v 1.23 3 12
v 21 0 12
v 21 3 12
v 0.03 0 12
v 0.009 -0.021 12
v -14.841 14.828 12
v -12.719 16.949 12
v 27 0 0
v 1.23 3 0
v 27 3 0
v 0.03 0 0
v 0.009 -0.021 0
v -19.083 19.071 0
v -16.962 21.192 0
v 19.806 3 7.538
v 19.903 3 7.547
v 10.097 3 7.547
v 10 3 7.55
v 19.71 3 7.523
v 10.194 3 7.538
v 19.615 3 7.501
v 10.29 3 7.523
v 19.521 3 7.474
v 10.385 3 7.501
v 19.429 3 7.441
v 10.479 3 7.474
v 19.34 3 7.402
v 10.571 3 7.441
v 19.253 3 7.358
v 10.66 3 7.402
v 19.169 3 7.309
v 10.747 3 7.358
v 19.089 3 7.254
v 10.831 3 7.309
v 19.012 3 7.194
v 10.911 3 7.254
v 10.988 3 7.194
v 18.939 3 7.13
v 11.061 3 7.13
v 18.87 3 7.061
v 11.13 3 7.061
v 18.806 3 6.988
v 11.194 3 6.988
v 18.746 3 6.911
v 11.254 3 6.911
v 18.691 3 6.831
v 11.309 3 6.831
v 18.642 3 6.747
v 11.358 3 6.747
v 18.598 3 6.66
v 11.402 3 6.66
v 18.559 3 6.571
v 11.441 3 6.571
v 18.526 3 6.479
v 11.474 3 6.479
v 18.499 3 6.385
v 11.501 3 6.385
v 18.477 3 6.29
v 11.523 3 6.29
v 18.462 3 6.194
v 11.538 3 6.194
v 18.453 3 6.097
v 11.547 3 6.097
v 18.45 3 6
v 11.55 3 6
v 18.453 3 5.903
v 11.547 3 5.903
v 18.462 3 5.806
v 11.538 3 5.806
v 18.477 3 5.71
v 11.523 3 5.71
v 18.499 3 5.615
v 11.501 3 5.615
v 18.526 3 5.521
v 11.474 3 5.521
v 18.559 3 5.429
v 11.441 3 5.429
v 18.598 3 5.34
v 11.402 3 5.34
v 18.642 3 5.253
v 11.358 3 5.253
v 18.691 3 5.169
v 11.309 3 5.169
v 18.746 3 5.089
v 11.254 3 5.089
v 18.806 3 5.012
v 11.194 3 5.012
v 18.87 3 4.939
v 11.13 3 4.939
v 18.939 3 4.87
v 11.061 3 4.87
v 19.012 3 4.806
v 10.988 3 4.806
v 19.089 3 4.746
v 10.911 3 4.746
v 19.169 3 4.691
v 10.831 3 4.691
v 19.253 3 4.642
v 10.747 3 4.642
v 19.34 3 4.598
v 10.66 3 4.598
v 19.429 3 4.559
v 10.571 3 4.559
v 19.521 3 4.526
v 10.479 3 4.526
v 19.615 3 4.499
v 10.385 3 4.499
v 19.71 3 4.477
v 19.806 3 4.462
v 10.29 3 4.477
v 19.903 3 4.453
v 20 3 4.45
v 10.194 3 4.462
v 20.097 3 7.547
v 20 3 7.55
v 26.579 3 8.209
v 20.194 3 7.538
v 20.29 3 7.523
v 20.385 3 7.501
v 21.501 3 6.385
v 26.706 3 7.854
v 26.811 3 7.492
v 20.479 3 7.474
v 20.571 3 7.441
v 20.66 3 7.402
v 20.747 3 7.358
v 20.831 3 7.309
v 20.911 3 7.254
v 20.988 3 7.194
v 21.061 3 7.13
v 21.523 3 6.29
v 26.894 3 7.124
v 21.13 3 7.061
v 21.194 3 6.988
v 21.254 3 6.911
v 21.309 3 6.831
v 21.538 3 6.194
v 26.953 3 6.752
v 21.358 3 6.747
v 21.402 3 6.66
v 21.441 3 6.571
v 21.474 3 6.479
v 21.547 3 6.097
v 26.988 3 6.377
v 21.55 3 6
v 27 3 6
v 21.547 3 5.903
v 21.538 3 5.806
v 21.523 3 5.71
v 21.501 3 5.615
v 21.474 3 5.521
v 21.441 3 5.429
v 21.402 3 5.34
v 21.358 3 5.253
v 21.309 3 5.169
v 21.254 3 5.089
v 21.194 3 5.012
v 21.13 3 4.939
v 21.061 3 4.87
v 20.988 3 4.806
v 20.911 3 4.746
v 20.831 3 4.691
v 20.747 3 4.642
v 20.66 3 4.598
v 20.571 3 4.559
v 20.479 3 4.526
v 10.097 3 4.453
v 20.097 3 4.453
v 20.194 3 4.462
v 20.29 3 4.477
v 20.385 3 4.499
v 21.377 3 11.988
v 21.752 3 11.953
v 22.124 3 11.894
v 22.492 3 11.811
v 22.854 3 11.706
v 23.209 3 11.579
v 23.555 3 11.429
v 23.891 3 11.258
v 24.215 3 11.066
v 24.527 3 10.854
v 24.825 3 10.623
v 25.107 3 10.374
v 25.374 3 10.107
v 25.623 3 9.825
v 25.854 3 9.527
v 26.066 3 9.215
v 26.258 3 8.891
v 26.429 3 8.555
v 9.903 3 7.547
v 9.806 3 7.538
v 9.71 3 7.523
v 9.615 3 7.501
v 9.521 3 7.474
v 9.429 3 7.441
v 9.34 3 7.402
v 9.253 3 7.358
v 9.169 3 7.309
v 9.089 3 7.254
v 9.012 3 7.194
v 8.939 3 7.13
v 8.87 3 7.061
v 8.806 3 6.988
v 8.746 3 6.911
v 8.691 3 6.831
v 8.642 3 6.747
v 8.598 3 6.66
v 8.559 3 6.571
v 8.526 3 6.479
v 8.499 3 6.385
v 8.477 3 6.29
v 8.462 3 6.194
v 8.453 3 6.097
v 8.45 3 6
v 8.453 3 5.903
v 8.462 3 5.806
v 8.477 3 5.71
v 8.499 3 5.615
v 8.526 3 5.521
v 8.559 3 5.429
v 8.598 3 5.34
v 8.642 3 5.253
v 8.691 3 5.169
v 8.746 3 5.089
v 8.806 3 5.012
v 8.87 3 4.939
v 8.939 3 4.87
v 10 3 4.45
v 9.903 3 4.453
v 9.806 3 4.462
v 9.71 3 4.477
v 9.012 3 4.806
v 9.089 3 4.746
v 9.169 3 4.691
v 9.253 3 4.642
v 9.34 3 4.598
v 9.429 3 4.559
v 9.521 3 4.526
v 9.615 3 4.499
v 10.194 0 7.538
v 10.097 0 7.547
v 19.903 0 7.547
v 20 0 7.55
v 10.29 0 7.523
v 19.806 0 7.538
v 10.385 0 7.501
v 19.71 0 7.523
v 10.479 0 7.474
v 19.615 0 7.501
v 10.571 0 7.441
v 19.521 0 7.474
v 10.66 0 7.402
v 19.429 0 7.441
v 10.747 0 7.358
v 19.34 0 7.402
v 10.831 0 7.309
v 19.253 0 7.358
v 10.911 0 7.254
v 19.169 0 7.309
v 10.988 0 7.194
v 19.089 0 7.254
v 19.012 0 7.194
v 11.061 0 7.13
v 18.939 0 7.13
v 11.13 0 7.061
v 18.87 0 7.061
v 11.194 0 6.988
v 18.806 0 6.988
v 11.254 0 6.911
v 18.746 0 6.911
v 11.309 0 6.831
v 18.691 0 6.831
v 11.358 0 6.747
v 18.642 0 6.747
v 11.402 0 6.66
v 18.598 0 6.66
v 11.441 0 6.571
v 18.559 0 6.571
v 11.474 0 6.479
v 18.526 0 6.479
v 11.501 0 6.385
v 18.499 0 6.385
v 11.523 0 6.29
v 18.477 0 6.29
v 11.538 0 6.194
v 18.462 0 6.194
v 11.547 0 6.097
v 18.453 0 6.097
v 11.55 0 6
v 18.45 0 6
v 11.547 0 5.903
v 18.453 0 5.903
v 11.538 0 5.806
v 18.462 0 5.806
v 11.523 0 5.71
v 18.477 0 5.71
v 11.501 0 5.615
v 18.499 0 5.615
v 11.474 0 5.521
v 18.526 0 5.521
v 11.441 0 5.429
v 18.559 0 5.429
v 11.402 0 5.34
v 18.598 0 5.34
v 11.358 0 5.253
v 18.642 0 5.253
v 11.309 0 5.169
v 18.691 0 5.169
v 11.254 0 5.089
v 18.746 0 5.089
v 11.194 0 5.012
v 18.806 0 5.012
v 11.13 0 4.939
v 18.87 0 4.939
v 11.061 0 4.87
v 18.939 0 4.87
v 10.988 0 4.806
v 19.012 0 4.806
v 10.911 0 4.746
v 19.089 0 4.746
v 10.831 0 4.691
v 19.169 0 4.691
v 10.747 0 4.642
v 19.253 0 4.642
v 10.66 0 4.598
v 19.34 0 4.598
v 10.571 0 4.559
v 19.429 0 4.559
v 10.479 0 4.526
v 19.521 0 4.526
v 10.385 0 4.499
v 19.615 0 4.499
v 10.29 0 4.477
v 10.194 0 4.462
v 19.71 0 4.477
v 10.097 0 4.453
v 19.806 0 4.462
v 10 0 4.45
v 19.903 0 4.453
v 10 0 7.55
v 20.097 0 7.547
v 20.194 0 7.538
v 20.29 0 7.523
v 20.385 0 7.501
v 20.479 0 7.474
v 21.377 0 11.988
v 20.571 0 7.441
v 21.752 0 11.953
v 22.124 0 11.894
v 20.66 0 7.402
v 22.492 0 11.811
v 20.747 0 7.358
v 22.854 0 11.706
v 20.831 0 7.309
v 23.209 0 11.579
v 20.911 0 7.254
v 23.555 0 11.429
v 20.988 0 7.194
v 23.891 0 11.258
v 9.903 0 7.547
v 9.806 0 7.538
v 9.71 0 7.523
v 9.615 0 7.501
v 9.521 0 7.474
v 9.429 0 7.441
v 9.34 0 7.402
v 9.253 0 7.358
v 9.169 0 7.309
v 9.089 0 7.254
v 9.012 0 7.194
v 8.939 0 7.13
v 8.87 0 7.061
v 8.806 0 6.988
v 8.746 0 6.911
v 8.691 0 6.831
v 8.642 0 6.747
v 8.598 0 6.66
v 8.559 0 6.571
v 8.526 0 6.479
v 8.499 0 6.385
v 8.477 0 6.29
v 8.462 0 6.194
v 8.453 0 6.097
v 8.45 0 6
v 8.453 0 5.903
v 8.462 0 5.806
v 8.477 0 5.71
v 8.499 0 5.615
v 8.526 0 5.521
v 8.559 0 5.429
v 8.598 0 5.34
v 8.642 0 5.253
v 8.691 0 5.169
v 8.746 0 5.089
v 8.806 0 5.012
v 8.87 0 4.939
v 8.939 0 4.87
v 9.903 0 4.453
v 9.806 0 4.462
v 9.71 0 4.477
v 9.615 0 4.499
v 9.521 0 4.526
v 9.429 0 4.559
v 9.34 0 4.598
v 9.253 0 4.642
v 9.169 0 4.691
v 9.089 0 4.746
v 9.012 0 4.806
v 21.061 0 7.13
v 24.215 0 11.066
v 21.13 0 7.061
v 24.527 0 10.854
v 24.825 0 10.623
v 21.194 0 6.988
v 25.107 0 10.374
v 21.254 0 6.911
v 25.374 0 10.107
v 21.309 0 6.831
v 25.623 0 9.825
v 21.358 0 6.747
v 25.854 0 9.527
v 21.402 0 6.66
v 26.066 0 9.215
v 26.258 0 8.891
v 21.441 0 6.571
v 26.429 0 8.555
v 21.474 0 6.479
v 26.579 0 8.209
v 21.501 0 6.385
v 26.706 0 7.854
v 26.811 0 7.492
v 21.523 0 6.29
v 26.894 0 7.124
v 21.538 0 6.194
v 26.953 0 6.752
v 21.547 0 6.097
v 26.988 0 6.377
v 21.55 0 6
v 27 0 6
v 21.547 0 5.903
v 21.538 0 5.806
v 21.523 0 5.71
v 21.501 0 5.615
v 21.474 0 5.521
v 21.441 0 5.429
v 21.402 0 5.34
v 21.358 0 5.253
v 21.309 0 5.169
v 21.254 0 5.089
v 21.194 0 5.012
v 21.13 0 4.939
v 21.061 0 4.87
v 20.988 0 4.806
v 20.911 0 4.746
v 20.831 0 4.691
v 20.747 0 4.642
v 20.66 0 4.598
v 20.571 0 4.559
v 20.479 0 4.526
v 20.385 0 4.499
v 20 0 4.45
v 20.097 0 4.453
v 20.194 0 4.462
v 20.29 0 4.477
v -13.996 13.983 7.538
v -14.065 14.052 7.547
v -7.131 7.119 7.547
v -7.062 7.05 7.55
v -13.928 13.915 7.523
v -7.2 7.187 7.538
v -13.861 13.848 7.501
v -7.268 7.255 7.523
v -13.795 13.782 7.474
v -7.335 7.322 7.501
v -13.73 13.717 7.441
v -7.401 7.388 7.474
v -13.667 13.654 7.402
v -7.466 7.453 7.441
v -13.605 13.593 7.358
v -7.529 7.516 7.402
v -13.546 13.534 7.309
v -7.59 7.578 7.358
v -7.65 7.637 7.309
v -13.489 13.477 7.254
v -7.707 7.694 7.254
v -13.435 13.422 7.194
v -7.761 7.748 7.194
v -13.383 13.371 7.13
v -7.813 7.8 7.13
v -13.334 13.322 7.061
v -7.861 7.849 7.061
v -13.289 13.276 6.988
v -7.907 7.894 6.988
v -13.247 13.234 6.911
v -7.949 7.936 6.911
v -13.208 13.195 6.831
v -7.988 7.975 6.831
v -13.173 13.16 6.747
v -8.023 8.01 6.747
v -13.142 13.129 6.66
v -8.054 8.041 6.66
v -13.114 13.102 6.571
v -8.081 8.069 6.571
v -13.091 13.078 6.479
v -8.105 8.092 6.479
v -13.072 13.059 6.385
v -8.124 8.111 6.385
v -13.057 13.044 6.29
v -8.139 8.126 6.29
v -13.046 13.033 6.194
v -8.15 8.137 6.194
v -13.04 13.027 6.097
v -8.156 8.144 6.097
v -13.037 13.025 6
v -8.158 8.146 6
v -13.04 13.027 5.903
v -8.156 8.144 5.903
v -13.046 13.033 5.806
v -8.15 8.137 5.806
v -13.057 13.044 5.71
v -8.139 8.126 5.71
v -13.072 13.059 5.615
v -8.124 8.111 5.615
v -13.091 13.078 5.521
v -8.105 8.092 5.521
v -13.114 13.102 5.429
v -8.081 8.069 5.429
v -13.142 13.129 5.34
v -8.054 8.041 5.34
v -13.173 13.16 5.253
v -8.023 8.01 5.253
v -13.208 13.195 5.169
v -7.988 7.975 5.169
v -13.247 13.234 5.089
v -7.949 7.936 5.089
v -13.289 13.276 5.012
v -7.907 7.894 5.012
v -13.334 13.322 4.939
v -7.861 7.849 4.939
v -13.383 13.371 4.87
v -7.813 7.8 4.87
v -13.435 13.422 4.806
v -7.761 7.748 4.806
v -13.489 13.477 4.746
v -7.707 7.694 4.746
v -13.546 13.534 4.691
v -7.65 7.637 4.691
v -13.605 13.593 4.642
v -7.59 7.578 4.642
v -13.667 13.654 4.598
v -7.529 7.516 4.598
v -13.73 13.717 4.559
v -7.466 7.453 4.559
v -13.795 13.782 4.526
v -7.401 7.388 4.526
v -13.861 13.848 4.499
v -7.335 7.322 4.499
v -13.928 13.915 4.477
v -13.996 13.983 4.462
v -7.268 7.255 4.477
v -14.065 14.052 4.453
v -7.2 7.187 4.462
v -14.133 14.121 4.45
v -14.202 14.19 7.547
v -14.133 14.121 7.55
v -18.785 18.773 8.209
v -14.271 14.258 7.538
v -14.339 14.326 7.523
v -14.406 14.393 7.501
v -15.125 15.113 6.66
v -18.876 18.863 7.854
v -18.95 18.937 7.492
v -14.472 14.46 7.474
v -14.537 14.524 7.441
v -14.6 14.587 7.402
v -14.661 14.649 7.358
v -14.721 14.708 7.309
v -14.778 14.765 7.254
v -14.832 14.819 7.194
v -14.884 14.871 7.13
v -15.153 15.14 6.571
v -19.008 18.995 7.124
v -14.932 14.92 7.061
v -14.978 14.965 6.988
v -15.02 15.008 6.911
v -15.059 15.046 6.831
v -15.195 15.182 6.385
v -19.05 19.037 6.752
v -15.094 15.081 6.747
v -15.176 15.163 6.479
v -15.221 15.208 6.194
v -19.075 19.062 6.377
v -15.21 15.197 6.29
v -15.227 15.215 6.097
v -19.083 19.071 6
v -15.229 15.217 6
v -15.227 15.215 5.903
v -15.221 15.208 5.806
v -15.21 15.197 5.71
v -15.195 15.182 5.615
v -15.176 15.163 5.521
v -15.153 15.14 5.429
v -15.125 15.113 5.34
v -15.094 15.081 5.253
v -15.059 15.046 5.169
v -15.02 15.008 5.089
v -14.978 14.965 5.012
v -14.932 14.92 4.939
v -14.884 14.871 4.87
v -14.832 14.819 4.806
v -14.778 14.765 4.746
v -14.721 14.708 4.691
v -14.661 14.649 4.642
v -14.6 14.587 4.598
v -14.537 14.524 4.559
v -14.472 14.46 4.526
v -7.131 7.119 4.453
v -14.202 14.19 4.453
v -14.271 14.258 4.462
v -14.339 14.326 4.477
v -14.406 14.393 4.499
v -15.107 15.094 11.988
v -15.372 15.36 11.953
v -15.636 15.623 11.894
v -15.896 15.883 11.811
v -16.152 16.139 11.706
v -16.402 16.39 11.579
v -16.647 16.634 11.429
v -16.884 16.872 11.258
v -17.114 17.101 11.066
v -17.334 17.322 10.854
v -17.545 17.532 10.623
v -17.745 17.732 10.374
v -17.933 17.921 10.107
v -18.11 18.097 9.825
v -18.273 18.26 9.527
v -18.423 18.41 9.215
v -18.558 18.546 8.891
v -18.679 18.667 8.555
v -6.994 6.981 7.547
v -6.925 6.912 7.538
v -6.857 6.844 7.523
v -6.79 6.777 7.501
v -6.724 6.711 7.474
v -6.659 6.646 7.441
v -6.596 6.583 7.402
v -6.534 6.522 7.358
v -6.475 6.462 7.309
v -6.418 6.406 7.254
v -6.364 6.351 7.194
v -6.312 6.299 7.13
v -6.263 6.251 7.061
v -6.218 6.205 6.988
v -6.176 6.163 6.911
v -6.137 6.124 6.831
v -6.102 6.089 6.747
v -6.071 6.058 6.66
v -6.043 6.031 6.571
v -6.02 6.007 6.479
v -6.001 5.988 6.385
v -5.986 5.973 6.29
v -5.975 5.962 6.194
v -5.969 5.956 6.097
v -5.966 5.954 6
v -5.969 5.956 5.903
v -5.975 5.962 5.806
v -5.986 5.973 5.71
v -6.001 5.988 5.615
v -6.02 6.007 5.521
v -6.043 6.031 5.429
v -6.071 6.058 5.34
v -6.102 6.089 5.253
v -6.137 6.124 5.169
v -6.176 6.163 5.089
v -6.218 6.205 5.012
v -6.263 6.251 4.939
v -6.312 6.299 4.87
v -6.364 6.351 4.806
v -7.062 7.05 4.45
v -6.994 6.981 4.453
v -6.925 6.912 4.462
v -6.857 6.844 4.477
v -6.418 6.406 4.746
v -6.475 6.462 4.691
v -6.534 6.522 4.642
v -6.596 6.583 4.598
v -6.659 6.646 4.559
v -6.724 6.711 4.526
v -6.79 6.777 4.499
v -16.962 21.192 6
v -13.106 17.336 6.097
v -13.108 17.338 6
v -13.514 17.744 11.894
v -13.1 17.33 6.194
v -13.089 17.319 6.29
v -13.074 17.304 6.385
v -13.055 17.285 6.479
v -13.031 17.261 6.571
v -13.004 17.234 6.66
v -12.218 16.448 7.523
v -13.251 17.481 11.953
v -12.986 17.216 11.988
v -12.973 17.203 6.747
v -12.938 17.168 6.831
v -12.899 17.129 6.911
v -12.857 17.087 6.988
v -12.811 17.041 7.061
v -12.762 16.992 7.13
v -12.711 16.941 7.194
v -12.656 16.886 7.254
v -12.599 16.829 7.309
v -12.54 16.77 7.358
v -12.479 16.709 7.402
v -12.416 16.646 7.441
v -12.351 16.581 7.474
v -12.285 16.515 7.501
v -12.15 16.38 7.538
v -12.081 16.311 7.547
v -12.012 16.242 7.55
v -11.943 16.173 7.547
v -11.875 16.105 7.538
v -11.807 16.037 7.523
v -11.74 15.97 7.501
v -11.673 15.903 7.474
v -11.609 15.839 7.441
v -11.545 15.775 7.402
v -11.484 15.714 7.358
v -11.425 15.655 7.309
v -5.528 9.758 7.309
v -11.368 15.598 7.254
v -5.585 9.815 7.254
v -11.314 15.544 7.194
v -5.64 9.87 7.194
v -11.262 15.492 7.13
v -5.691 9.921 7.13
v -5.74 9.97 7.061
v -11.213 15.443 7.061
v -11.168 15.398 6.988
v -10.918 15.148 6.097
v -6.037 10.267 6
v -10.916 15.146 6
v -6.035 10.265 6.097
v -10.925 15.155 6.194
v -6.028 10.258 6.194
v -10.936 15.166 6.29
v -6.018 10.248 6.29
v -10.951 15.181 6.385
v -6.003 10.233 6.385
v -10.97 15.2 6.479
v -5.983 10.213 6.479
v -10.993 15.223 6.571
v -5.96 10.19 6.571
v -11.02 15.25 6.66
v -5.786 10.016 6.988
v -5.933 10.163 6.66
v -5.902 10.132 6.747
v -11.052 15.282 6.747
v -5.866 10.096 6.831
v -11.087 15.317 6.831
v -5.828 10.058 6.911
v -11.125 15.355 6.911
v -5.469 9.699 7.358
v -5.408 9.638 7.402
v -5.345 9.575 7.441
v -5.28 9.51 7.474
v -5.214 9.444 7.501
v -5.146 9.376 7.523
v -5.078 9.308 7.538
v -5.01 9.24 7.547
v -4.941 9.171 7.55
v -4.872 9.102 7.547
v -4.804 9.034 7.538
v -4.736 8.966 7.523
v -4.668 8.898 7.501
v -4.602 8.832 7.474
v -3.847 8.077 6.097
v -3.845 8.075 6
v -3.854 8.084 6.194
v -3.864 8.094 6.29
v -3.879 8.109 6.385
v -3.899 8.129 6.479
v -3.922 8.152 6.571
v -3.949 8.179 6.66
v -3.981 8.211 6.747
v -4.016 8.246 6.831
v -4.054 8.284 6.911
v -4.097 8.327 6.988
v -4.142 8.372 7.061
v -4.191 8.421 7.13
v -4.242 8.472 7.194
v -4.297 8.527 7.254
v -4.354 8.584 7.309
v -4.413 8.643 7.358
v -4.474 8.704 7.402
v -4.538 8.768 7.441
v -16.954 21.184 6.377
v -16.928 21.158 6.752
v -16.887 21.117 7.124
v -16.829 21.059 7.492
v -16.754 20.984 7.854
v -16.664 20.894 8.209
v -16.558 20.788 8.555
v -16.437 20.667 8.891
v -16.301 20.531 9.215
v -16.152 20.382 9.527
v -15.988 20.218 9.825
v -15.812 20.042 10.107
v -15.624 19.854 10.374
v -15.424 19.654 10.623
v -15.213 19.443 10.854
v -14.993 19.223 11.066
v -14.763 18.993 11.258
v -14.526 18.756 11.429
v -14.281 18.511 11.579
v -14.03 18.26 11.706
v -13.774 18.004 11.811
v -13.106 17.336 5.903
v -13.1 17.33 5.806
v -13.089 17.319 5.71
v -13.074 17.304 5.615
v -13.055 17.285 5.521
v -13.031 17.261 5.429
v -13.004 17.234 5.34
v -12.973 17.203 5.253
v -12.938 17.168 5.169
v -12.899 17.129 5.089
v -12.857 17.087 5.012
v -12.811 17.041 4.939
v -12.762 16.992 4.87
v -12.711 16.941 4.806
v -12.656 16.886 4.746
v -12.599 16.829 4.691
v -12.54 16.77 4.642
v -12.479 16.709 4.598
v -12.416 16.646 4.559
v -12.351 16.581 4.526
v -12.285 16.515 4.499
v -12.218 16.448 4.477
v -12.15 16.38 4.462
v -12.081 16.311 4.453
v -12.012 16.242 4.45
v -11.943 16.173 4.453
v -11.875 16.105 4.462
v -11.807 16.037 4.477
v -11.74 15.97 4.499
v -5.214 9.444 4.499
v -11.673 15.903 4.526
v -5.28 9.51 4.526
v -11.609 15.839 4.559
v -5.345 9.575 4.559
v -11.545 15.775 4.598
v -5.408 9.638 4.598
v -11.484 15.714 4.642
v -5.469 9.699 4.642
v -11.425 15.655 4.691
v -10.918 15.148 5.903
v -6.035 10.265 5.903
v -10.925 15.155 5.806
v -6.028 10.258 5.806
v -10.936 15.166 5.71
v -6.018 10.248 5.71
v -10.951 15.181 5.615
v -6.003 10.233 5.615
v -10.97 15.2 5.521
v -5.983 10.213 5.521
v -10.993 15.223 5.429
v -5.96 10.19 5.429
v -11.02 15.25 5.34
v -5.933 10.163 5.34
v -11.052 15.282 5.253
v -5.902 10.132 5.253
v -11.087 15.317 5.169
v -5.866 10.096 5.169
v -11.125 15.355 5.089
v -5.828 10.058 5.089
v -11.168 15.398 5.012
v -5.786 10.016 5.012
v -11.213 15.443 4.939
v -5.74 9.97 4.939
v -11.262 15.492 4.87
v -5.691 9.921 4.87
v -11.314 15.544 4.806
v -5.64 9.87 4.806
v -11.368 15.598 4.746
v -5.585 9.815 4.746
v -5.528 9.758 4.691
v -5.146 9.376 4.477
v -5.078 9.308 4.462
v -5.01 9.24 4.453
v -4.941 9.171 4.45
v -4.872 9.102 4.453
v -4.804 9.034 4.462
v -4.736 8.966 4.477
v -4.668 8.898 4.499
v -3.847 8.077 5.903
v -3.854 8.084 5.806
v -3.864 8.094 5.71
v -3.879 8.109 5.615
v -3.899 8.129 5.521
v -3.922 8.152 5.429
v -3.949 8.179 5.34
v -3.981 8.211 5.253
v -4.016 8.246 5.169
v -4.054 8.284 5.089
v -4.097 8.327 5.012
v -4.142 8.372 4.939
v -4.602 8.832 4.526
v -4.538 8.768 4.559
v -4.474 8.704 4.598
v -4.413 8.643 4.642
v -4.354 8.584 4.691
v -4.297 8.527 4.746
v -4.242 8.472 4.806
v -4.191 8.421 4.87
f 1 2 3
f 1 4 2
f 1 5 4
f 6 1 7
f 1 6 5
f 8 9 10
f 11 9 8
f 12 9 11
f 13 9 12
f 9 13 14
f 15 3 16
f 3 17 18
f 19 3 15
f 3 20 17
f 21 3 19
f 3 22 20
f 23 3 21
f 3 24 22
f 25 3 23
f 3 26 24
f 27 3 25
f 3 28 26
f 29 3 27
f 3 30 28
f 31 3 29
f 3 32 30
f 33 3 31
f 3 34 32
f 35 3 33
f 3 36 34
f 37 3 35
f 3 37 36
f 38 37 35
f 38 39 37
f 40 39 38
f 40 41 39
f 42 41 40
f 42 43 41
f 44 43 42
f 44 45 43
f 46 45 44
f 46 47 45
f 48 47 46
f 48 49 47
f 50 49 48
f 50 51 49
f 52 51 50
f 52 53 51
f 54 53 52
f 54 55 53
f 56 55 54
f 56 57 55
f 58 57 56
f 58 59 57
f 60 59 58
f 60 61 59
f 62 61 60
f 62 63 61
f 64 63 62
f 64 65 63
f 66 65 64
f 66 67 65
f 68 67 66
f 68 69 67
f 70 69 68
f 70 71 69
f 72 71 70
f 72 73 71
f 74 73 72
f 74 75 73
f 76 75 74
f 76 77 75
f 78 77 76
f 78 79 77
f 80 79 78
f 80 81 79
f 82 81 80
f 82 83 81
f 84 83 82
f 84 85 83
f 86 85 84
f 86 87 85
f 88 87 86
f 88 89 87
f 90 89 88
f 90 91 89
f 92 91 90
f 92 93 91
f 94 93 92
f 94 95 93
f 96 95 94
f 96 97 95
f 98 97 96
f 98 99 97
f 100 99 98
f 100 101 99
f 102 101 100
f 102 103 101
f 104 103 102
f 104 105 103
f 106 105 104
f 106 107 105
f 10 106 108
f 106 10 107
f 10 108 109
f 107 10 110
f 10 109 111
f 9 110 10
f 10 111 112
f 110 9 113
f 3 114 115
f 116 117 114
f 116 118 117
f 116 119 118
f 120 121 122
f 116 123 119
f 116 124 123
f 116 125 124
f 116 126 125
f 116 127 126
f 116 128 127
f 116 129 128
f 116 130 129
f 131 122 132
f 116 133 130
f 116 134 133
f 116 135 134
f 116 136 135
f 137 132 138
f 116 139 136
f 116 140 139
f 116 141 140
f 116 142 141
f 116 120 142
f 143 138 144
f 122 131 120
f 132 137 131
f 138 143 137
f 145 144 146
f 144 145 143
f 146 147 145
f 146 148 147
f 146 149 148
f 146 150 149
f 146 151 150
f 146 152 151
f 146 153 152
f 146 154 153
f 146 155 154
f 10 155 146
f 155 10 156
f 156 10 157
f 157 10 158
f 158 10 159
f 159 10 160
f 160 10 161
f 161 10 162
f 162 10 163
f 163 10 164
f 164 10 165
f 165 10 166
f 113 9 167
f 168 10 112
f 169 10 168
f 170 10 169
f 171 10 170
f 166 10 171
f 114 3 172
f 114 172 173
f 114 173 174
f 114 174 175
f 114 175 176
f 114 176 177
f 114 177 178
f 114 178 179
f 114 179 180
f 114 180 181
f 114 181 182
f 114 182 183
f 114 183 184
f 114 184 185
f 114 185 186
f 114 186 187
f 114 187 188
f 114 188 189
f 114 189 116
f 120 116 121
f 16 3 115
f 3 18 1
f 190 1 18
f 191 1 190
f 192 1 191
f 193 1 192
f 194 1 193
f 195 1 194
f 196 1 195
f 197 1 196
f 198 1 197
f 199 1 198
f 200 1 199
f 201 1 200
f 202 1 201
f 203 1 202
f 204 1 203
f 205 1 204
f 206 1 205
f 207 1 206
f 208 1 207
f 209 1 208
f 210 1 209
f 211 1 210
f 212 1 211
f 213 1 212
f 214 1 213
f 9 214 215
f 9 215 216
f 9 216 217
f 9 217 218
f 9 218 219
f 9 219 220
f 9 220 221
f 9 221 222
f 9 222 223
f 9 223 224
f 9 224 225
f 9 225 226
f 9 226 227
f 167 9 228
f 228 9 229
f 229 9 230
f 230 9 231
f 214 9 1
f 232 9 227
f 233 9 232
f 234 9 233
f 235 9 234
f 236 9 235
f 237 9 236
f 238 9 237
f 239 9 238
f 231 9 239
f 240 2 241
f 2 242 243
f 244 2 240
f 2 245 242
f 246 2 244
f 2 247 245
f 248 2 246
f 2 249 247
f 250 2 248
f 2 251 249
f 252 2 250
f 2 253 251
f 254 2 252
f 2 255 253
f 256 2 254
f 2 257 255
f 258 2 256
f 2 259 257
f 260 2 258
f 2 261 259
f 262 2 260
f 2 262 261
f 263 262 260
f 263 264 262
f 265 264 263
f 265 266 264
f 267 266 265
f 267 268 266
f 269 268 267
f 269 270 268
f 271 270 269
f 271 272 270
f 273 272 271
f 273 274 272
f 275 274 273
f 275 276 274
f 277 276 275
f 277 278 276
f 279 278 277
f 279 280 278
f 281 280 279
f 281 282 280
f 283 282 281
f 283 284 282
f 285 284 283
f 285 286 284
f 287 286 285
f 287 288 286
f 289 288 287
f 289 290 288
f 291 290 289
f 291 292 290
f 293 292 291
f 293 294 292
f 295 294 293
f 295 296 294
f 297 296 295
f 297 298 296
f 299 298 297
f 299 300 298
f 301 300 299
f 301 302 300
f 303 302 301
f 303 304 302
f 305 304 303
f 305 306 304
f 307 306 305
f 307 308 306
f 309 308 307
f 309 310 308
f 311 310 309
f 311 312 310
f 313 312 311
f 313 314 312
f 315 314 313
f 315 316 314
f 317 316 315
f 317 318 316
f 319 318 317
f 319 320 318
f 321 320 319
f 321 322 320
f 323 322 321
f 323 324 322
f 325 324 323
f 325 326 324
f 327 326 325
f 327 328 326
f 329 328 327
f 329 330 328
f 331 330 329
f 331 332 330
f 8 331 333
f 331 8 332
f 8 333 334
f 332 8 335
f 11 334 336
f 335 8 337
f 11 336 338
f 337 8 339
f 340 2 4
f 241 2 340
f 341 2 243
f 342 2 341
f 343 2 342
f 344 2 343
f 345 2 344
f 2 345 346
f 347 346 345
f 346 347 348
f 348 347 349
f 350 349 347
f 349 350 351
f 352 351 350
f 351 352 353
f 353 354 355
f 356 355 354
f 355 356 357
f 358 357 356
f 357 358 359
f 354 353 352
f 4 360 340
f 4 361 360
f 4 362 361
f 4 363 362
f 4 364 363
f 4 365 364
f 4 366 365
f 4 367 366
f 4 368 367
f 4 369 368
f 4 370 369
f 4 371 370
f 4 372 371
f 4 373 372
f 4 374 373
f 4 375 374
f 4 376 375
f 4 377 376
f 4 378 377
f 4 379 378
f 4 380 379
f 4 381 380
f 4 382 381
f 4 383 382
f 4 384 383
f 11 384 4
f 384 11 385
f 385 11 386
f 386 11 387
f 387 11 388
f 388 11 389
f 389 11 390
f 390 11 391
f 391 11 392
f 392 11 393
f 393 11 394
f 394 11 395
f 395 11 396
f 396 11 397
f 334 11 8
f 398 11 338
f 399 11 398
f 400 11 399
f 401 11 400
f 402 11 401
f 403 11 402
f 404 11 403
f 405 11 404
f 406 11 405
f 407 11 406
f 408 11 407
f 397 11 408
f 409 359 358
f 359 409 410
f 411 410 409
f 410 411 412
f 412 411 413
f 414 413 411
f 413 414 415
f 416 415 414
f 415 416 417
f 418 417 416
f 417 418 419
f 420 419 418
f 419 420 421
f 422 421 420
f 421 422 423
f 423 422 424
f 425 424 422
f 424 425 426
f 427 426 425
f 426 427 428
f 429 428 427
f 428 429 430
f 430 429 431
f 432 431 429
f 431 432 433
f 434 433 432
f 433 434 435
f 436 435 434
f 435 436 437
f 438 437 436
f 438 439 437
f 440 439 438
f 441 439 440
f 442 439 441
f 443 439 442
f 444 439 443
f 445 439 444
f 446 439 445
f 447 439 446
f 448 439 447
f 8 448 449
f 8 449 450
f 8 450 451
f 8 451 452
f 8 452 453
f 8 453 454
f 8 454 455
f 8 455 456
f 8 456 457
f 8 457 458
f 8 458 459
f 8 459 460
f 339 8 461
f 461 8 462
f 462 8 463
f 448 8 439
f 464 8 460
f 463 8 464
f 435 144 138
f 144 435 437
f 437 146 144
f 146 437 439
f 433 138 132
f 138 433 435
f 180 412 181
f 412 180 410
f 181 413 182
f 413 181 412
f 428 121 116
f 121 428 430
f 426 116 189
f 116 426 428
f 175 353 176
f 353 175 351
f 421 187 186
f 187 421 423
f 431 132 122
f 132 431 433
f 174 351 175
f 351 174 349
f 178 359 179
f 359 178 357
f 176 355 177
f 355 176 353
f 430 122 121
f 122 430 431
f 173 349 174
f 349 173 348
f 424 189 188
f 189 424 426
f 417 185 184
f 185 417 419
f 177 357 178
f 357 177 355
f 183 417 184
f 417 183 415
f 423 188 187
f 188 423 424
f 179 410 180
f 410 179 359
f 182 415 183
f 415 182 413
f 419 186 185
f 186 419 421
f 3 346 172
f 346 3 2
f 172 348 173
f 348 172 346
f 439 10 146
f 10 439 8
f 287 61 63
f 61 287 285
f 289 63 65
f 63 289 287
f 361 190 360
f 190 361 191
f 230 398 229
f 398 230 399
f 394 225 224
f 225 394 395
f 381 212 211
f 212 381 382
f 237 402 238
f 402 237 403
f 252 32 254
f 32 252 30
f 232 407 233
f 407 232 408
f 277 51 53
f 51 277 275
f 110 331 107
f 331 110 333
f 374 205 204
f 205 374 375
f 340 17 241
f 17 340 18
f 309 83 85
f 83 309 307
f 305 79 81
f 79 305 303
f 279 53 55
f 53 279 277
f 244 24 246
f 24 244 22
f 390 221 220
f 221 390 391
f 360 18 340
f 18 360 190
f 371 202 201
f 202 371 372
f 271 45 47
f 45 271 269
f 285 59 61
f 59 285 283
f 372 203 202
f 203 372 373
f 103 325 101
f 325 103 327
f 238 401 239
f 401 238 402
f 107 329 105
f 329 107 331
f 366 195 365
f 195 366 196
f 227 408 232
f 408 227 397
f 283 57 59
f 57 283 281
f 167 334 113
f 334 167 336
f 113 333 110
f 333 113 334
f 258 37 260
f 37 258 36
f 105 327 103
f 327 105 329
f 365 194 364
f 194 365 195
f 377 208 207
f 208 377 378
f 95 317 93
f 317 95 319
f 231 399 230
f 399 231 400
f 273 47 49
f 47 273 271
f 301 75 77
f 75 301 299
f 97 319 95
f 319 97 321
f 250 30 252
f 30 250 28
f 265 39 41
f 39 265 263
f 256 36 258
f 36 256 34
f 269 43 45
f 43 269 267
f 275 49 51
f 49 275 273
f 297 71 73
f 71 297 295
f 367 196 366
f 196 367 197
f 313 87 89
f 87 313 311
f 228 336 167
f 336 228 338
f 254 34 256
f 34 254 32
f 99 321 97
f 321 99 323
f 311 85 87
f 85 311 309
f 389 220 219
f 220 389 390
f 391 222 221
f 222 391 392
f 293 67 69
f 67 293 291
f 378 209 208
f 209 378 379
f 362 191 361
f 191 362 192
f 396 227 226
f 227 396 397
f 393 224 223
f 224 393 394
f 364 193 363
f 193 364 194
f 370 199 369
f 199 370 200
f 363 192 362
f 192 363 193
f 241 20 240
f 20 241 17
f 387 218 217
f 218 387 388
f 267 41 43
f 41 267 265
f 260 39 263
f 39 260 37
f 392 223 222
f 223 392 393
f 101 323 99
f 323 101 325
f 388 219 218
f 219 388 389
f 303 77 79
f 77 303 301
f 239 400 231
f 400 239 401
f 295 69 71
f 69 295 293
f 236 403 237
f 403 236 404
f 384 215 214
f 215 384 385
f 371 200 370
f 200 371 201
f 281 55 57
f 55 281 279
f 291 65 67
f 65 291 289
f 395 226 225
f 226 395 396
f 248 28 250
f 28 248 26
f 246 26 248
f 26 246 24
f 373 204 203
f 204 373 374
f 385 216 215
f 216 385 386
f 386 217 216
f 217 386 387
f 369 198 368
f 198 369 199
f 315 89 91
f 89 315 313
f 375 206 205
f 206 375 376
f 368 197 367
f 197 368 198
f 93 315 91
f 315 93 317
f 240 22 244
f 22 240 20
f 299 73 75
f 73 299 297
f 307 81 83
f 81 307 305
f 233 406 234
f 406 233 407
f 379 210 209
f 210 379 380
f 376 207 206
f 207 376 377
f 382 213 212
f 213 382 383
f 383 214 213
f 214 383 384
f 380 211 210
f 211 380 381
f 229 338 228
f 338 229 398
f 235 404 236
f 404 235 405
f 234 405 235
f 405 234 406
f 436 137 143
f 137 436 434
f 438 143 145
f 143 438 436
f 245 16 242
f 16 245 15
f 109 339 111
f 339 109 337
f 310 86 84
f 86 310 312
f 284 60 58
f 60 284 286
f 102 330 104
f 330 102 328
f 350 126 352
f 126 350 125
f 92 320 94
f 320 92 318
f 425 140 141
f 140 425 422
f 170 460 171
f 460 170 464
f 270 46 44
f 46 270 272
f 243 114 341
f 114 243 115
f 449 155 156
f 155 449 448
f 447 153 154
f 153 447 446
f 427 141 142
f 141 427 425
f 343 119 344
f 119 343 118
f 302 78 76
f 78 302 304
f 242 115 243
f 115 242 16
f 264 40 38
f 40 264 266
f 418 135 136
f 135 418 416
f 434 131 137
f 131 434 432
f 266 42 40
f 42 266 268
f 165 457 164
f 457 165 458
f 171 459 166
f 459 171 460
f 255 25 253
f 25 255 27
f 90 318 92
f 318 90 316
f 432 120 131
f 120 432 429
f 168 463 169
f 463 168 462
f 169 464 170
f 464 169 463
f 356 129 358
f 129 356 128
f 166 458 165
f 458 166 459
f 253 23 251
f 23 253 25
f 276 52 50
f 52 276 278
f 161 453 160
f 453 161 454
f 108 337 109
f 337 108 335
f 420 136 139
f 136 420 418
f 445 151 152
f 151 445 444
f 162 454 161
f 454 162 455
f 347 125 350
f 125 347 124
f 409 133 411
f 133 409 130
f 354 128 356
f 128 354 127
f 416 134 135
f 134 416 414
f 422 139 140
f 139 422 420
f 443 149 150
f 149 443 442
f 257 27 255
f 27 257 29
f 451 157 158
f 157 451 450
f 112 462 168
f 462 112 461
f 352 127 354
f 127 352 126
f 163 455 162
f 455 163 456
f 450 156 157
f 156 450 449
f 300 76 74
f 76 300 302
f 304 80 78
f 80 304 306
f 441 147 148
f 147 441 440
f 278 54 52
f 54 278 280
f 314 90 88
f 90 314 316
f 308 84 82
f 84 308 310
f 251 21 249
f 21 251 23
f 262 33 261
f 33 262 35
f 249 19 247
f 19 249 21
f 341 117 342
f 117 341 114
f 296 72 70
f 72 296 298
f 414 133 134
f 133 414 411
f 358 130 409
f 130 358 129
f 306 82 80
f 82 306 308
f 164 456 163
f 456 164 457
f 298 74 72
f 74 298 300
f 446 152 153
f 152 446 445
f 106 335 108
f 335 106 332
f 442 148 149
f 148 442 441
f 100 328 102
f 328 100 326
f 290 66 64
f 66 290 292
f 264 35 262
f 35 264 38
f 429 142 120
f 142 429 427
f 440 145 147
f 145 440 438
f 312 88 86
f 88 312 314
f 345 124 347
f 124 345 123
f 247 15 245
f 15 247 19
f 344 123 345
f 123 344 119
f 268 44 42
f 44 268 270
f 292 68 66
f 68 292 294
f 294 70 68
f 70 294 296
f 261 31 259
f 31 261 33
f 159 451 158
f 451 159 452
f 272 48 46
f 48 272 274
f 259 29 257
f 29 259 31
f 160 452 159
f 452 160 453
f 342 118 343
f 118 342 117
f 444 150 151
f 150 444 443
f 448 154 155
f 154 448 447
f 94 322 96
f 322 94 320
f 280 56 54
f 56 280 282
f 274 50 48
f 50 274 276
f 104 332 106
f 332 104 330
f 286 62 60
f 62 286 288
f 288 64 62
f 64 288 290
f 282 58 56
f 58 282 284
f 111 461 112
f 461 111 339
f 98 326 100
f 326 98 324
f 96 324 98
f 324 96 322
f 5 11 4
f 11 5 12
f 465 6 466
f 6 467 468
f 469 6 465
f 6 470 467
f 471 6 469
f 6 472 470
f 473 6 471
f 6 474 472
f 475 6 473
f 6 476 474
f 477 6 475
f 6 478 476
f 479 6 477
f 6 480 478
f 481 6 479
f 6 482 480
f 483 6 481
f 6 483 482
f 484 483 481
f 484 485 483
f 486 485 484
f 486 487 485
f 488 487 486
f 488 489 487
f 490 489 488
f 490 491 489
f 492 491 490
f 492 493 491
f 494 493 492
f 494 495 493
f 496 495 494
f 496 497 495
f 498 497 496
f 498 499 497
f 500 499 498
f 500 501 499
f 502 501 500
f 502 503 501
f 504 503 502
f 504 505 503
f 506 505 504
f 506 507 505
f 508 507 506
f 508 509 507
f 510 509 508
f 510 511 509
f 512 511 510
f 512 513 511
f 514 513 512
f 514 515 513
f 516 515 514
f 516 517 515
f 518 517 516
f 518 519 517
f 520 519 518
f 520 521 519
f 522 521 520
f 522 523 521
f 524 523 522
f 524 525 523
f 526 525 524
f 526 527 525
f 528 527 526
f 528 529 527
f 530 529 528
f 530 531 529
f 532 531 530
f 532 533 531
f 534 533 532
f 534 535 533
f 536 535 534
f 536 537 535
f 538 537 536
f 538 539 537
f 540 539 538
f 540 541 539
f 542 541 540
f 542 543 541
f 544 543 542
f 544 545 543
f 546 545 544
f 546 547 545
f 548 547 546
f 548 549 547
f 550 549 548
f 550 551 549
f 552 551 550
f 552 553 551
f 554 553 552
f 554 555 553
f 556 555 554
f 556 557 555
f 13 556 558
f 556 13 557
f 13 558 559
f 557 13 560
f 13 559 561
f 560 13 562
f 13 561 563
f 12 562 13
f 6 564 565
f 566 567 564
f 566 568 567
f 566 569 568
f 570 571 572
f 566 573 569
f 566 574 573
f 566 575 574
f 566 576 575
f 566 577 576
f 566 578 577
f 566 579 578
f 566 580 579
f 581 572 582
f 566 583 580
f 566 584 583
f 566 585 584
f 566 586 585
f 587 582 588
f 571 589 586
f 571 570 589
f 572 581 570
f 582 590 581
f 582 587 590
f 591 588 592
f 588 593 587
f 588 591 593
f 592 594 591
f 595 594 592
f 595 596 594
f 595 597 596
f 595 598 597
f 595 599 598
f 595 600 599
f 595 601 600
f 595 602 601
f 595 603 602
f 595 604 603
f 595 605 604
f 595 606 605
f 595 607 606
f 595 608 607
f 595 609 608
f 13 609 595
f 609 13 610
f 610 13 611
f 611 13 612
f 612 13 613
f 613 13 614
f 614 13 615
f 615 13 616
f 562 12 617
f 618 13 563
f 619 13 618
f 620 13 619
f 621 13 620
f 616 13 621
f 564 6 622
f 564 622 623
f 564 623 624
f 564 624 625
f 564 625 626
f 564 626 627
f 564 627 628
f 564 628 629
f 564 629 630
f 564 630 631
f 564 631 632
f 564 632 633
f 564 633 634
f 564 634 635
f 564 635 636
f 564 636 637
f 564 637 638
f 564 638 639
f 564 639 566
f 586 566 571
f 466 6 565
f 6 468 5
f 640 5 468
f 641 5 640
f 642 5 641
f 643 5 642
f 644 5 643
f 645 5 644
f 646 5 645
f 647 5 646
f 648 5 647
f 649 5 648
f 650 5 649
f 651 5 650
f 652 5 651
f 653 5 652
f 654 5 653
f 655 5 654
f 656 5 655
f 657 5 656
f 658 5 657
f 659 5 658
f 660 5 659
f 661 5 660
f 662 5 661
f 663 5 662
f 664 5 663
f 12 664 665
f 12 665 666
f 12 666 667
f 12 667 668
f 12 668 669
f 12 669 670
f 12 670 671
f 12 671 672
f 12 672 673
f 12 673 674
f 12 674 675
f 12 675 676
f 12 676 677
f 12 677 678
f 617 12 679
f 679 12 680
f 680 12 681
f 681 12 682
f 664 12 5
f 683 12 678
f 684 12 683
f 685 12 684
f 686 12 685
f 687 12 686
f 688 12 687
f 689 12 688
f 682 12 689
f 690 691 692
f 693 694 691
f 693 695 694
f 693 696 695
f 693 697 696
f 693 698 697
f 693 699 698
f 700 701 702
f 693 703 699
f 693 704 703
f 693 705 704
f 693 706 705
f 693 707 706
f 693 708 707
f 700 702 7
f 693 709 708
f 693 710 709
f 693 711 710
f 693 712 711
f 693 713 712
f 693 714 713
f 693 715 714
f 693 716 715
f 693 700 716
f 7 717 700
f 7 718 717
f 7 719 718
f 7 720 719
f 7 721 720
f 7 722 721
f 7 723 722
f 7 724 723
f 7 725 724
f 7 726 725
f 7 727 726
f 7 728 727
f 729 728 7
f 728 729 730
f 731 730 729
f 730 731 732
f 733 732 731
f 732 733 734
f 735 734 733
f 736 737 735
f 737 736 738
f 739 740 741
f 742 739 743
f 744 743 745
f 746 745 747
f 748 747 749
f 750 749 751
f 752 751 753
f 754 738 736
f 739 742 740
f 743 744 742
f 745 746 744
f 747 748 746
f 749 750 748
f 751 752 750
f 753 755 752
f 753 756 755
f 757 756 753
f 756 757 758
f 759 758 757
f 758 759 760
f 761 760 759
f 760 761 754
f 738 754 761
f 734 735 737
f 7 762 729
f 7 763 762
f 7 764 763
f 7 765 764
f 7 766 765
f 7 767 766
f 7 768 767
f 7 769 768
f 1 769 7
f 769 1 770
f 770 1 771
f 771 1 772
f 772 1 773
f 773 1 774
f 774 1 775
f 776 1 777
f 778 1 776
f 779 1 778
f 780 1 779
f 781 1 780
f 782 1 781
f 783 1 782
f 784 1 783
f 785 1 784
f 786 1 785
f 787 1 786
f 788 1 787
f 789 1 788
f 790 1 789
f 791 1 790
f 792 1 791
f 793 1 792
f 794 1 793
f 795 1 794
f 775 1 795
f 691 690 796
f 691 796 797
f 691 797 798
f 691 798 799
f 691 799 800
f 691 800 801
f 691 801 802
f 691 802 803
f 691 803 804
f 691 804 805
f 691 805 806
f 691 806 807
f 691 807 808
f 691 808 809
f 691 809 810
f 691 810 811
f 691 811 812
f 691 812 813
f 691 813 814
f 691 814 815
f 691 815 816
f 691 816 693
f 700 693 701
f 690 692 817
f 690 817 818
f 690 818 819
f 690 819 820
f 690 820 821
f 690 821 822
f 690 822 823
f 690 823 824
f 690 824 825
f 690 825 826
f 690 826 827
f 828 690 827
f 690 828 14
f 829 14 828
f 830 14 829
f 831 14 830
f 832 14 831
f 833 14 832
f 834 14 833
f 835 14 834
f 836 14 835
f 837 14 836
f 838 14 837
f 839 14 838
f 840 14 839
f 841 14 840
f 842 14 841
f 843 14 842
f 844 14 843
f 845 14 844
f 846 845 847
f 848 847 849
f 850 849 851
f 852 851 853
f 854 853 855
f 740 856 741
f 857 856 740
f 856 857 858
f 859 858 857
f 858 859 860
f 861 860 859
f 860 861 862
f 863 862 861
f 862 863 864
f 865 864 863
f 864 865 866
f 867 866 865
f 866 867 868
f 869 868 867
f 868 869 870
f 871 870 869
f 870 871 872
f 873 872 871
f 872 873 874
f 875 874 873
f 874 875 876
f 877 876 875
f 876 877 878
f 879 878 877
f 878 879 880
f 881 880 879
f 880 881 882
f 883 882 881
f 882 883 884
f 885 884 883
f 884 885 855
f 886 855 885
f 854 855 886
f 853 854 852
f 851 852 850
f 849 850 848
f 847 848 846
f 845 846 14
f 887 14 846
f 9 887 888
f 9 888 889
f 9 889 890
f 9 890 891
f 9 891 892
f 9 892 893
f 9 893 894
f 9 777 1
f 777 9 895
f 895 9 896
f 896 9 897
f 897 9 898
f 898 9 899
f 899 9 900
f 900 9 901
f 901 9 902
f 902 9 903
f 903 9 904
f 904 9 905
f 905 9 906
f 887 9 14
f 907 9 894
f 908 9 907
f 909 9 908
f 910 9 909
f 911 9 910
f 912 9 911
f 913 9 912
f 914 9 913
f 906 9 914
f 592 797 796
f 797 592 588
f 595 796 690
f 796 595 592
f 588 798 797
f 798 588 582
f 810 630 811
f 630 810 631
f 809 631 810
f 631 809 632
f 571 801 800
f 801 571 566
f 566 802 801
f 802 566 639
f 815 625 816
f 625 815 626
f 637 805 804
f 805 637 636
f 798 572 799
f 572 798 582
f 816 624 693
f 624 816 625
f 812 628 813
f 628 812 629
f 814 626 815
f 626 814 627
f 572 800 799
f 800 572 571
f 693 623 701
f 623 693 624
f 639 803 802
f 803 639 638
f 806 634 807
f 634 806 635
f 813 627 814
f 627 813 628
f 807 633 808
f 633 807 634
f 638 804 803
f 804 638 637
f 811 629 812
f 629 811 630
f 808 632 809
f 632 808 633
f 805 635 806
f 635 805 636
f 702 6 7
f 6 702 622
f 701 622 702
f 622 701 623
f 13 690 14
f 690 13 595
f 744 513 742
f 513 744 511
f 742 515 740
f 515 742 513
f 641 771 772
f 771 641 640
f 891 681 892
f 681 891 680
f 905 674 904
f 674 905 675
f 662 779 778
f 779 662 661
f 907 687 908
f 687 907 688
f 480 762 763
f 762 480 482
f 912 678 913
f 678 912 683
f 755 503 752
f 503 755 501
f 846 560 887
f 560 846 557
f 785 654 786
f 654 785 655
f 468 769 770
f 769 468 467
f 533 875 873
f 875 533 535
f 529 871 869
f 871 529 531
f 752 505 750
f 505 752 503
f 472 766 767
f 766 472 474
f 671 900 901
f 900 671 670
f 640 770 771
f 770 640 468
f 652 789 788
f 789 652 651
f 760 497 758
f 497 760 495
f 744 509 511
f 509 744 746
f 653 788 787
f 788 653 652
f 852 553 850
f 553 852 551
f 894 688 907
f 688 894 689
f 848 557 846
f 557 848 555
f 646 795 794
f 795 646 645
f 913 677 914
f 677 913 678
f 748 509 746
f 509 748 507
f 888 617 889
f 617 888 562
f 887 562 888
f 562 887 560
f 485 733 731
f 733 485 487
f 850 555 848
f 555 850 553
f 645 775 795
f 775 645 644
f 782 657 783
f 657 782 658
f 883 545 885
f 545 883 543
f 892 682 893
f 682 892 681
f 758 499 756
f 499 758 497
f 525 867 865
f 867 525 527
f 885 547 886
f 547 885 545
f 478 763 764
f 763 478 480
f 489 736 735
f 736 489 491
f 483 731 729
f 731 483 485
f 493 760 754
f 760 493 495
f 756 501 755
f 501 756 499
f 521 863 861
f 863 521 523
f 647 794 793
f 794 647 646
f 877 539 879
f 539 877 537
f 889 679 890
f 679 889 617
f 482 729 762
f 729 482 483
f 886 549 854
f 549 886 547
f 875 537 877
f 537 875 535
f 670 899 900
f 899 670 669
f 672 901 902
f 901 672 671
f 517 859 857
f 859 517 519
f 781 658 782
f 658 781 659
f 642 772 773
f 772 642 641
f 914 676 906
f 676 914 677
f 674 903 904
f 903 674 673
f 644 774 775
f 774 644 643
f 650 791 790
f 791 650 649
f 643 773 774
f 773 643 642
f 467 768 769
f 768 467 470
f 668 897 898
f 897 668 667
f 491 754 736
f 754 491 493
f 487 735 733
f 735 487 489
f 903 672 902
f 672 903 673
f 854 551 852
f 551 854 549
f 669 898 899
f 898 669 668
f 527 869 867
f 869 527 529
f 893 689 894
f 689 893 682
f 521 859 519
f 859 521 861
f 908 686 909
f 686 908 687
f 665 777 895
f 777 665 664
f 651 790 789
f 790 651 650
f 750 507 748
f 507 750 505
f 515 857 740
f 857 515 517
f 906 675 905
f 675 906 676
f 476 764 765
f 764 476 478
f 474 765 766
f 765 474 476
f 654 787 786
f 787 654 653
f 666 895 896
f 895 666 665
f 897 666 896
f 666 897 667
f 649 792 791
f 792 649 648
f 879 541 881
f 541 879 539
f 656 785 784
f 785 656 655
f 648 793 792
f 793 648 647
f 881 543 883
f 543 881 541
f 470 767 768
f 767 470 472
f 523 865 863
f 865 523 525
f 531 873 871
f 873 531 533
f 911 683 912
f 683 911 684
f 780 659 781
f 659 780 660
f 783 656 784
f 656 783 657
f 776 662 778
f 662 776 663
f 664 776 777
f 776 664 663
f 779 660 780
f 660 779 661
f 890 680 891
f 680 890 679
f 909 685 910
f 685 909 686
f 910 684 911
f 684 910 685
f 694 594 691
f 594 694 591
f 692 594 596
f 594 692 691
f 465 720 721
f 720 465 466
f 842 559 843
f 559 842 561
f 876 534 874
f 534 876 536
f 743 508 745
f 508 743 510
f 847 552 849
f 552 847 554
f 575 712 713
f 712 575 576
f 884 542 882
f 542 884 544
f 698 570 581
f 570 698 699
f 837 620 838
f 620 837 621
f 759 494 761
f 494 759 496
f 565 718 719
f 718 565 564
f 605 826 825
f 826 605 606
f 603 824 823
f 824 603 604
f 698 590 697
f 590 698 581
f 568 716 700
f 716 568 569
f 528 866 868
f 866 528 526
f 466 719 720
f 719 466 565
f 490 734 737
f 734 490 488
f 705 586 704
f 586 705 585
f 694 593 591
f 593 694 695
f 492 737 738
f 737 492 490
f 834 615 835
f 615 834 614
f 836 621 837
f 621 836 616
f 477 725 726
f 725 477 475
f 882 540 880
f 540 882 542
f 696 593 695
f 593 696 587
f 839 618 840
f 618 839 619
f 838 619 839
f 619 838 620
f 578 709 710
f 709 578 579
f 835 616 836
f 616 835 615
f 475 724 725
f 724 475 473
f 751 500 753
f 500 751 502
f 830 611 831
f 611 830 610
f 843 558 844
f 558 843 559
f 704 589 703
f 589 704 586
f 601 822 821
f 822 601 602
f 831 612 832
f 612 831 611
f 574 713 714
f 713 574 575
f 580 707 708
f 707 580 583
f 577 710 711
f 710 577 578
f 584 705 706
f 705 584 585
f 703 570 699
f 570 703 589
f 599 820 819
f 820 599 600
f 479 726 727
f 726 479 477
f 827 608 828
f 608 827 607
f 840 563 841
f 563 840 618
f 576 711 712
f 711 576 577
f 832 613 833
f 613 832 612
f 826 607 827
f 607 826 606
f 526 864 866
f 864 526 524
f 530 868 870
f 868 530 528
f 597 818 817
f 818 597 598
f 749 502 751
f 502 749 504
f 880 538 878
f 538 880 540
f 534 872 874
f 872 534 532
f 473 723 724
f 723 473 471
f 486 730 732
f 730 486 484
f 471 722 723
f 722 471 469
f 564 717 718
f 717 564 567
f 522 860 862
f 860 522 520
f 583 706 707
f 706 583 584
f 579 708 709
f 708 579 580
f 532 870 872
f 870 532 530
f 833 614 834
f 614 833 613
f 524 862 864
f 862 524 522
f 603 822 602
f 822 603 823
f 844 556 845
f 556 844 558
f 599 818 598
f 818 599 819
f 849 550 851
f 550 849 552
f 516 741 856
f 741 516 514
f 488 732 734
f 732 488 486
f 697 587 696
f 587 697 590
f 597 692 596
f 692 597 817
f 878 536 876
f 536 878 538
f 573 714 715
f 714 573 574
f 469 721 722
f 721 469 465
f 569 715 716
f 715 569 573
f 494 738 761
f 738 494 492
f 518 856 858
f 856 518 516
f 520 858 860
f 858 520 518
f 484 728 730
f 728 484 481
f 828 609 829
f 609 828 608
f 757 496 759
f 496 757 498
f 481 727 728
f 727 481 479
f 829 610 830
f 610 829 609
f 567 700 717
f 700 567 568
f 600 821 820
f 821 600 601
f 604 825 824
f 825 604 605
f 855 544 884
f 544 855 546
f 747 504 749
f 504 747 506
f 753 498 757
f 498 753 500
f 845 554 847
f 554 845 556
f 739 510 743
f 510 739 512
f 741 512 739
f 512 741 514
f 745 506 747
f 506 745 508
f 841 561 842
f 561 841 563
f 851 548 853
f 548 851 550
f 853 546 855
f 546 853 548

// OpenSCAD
$fn = 100;

module demi_equerre(){
    difference(){
        union(){
            cube([21, 3, 12]);
            translate([21, 3, 6]) rotate ([90, 0, 0]) cylinder(d = 12, h=3);
            translate([21, 0, 0]) cube([6, 3, 6]);
        }
        
        translate([10, 1.5, 6]) rotate([90, 0, 0]) cylinder(d = 3.1, h=3.2, center = true);
        translate([20, 1.5, 6]) rotate([90, 0, 0]) cylinder(d = 3.1, h=3.2, center = true);
    }
    
}

module equerre_pince(){
    demi_equerre();
    translate([2.95, 0.52, 0]) rotate([0, 0, 100]) color("blue") demi_equerre();
}

module equerre_cote(){
    demi_equerre();
    translate([2.13, 2.1, 0]) rotate([0, 0, 135]) color("blue") demi_equerre();
}

equerre_cote();
